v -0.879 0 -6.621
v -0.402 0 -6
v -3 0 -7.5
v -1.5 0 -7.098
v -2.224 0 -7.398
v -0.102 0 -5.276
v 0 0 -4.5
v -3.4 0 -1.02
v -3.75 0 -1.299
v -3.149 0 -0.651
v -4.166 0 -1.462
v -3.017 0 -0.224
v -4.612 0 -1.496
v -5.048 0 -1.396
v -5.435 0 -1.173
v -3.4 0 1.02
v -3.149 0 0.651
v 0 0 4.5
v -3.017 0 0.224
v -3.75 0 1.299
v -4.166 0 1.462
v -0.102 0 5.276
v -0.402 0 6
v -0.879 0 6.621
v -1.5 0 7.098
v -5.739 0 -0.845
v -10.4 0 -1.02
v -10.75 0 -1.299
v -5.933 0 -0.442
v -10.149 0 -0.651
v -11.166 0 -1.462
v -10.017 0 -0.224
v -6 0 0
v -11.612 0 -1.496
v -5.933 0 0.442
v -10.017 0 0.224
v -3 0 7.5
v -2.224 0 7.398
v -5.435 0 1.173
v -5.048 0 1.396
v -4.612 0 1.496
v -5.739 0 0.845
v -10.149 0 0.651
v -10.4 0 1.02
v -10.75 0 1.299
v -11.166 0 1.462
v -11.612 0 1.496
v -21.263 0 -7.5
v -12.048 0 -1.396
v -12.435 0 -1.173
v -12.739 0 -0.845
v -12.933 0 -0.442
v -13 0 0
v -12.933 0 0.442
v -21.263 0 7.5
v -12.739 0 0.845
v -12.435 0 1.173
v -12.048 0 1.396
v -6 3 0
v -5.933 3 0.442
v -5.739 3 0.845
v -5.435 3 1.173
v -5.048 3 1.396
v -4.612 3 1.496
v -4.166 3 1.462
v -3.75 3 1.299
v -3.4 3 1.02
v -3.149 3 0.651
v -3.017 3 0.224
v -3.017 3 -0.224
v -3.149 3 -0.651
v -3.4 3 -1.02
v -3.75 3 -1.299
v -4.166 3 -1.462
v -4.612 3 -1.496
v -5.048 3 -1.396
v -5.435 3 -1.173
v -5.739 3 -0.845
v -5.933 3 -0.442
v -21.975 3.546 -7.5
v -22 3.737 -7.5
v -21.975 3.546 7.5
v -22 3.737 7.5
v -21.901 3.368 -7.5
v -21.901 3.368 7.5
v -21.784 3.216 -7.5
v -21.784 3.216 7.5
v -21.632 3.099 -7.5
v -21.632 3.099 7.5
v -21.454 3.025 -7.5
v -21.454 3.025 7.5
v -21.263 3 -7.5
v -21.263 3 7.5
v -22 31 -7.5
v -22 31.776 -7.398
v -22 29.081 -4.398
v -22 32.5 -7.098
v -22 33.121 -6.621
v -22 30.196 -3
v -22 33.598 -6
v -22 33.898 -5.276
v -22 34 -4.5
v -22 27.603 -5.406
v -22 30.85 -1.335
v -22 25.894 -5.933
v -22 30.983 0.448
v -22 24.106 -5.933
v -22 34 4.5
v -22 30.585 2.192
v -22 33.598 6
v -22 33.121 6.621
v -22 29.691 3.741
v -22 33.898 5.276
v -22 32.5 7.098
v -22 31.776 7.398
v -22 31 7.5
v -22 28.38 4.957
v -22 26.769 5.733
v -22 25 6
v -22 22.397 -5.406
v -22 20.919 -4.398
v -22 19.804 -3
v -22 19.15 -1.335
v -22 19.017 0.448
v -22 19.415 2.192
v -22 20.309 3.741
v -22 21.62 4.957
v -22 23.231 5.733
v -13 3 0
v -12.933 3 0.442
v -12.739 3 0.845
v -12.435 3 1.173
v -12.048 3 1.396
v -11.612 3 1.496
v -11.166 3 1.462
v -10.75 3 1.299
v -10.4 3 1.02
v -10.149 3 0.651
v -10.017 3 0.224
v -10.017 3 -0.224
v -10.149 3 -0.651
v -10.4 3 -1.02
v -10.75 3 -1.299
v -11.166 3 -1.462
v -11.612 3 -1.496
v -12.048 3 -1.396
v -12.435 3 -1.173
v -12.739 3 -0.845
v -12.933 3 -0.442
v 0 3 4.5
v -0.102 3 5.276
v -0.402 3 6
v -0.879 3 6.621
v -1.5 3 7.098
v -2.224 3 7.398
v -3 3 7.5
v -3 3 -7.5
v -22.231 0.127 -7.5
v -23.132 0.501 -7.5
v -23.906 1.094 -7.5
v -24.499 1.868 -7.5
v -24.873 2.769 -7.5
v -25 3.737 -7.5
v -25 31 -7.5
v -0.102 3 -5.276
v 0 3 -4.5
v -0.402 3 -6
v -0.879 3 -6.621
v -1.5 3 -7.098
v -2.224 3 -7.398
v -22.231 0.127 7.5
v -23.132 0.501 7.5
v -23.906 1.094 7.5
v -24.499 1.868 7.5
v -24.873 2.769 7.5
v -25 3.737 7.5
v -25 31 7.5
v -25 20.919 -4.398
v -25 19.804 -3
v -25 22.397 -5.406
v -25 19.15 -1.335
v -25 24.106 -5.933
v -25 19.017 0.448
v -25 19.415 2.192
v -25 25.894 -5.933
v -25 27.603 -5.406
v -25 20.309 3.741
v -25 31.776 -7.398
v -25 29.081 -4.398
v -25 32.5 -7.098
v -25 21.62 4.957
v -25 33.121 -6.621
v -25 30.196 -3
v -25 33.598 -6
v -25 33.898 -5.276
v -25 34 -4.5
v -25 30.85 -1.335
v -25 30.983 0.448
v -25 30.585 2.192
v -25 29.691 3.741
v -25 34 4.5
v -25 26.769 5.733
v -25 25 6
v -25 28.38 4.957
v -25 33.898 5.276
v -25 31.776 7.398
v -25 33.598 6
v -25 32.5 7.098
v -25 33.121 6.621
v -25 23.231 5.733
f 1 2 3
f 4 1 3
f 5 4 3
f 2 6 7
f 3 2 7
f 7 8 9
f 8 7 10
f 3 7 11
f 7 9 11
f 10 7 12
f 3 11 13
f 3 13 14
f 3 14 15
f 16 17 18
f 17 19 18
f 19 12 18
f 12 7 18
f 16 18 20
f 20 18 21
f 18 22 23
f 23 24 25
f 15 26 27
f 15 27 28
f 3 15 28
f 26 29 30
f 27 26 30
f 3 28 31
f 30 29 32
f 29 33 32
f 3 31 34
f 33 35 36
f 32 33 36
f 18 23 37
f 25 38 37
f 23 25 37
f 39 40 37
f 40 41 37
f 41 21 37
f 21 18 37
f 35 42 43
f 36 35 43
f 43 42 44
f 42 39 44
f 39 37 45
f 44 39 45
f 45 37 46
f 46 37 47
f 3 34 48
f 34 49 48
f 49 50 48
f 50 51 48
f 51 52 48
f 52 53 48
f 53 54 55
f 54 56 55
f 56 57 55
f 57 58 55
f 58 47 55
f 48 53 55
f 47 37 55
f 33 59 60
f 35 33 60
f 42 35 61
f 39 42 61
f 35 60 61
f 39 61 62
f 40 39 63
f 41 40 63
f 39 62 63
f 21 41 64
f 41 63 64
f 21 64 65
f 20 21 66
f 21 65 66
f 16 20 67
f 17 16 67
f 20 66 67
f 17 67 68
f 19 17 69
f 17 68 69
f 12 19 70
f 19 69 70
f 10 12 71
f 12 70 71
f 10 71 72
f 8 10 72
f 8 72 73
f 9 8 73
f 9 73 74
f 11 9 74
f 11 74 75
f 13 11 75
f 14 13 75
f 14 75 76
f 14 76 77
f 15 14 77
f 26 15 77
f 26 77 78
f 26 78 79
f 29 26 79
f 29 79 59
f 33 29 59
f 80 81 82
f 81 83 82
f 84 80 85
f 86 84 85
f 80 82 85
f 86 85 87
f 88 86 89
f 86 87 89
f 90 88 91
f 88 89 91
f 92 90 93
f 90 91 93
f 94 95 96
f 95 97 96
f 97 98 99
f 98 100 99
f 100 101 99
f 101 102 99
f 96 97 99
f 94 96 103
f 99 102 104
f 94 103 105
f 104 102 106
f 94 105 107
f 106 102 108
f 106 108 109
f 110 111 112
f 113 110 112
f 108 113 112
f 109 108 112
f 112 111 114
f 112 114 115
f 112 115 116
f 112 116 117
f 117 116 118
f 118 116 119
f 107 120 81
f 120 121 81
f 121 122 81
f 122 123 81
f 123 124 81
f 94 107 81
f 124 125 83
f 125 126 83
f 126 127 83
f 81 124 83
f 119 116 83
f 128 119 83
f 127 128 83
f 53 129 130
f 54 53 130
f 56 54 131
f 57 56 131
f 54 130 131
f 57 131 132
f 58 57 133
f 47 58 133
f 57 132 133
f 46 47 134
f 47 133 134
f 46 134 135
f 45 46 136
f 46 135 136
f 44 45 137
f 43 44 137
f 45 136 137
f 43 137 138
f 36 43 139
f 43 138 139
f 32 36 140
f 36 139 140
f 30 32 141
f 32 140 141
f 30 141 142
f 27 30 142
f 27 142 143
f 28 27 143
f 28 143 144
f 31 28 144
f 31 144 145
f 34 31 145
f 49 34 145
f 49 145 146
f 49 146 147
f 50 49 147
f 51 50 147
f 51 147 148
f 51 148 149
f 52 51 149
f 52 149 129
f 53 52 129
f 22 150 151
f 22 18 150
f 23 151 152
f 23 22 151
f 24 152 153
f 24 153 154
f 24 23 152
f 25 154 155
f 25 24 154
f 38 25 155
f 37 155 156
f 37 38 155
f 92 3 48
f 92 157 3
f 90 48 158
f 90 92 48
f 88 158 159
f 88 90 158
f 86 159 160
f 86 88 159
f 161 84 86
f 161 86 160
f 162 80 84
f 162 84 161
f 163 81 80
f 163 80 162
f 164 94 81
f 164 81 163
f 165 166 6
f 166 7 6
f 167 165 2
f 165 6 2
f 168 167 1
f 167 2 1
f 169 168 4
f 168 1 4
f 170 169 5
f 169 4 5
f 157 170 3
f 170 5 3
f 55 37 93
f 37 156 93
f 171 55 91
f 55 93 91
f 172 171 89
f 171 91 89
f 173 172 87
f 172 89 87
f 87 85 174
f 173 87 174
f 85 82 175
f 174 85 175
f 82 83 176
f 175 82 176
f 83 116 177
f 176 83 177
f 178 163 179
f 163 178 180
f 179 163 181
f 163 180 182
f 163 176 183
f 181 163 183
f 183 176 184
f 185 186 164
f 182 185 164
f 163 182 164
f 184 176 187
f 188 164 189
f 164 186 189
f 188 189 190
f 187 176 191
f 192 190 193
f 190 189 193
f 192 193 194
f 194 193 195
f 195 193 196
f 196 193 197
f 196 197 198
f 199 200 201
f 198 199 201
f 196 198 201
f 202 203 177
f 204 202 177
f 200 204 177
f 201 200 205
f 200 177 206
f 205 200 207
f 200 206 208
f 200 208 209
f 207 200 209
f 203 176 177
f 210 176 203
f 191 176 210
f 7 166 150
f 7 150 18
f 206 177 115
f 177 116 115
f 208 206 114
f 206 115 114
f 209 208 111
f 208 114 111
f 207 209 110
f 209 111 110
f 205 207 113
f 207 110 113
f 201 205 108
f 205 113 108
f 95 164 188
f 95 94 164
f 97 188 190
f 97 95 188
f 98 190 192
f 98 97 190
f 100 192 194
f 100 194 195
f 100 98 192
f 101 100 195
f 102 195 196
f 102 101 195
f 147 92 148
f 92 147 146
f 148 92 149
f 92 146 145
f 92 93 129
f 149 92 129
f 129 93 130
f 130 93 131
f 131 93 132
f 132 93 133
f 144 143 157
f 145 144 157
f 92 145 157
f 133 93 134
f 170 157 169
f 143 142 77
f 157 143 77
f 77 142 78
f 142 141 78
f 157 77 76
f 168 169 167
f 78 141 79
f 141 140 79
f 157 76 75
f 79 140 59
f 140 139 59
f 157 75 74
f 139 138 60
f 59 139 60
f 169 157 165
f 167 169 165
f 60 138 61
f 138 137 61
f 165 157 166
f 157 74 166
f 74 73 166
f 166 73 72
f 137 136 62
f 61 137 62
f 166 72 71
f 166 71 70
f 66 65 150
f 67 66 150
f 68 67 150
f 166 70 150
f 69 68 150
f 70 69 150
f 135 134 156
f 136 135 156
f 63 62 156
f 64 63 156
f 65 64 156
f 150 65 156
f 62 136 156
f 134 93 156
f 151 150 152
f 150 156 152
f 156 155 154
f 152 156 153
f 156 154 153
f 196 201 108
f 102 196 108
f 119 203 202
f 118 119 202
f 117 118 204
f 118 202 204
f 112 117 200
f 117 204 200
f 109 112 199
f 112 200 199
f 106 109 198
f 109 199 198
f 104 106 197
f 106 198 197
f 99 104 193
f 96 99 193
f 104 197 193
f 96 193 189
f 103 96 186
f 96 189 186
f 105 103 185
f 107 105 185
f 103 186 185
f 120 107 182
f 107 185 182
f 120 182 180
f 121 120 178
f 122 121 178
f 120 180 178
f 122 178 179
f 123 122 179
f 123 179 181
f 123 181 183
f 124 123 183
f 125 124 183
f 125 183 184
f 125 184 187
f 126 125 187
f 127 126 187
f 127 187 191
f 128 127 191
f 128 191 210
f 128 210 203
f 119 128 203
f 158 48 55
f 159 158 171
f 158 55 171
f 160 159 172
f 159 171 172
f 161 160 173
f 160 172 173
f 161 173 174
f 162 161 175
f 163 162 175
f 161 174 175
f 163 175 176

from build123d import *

# Parameters (mm, degrees)
BASE_FLANGE1_DEPTH = 7.5
SKETCH6_R          = 6
CUT_EXTRUDE1_DEPTH = 43.86315434
SKETCH7_R          = 1.5
CUT_EXTRUDE2_DEPTH = 41.524683836
FILLET1_R          = 3


# Sheet-metal steps are written as plain solids
with BuildPart() as part:
    # Sketch1 → Base-Flange1 (new, symmetric)
    with BuildSketch(Plane.XY):
        with BuildLine():
            Line((0, 0), (-21.2634, 0))
            ThreePointArc((-21.2634, 0), (-23.905575199, 1.094424801), (-25, 3.7366))
            Line((-25, 3.7366), (-25, 34))
            Line((-25, 34), (-22, 34))
            Line((-22, 34), (-22, 3.7366))
            ThreePointArc((-22, 3.7366), (-21.784254855, 3.215745145), (-21.2634, 3))
            Line((-21.2634, 3), (0, 3))
            Line((0, 3), (0, 0))
        make_face()
    extrude(amount=BASE_FLANGE1_DEPTH, both=True)

    # Sketch6 → Cut-Extrude1 (cut, through all)
    with BuildSketch(Plane.ZY.offset(25)):
        with Locations((0, 25)):
            Circle(SKETCH6_R)
    extrude(amount=-CUT_EXTRUDE1_DEPTH, mode=Mode.SUBTRACT)

    # Sketch7 → Cut-Extrude2 (cut, through all)
    with BuildSketch(Plane(origin=(0, 3, 0), x_dir=(1, 0, 0), z_dir=(0, 1, 0))):
        with Locations(Location((-4.5, 0, 0), (0, 0, 180))):
            Circle(SKETCH7_R)
        with Locations(Location((-11.5, 0, 0), (0, 0, 180))):
            Circle(SKETCH7_R)
    extrude(amount=-CUT_EXTRUDE2_DEPTH, mode=Mode.SUBTRACT)

    # Fillet1
    fillet1_edges = [part.edges().sort_by_distance(p)[0] for p in [
        (0, 1.5, 7.5),
        (0, 1.5, -7.5),
        (-23.5, 34, 7.5),
        (-23.5, 34, -7.5),
    ]]
    fillet(fillet1_edges, radius=FILLET1_R)


solid = part.part
